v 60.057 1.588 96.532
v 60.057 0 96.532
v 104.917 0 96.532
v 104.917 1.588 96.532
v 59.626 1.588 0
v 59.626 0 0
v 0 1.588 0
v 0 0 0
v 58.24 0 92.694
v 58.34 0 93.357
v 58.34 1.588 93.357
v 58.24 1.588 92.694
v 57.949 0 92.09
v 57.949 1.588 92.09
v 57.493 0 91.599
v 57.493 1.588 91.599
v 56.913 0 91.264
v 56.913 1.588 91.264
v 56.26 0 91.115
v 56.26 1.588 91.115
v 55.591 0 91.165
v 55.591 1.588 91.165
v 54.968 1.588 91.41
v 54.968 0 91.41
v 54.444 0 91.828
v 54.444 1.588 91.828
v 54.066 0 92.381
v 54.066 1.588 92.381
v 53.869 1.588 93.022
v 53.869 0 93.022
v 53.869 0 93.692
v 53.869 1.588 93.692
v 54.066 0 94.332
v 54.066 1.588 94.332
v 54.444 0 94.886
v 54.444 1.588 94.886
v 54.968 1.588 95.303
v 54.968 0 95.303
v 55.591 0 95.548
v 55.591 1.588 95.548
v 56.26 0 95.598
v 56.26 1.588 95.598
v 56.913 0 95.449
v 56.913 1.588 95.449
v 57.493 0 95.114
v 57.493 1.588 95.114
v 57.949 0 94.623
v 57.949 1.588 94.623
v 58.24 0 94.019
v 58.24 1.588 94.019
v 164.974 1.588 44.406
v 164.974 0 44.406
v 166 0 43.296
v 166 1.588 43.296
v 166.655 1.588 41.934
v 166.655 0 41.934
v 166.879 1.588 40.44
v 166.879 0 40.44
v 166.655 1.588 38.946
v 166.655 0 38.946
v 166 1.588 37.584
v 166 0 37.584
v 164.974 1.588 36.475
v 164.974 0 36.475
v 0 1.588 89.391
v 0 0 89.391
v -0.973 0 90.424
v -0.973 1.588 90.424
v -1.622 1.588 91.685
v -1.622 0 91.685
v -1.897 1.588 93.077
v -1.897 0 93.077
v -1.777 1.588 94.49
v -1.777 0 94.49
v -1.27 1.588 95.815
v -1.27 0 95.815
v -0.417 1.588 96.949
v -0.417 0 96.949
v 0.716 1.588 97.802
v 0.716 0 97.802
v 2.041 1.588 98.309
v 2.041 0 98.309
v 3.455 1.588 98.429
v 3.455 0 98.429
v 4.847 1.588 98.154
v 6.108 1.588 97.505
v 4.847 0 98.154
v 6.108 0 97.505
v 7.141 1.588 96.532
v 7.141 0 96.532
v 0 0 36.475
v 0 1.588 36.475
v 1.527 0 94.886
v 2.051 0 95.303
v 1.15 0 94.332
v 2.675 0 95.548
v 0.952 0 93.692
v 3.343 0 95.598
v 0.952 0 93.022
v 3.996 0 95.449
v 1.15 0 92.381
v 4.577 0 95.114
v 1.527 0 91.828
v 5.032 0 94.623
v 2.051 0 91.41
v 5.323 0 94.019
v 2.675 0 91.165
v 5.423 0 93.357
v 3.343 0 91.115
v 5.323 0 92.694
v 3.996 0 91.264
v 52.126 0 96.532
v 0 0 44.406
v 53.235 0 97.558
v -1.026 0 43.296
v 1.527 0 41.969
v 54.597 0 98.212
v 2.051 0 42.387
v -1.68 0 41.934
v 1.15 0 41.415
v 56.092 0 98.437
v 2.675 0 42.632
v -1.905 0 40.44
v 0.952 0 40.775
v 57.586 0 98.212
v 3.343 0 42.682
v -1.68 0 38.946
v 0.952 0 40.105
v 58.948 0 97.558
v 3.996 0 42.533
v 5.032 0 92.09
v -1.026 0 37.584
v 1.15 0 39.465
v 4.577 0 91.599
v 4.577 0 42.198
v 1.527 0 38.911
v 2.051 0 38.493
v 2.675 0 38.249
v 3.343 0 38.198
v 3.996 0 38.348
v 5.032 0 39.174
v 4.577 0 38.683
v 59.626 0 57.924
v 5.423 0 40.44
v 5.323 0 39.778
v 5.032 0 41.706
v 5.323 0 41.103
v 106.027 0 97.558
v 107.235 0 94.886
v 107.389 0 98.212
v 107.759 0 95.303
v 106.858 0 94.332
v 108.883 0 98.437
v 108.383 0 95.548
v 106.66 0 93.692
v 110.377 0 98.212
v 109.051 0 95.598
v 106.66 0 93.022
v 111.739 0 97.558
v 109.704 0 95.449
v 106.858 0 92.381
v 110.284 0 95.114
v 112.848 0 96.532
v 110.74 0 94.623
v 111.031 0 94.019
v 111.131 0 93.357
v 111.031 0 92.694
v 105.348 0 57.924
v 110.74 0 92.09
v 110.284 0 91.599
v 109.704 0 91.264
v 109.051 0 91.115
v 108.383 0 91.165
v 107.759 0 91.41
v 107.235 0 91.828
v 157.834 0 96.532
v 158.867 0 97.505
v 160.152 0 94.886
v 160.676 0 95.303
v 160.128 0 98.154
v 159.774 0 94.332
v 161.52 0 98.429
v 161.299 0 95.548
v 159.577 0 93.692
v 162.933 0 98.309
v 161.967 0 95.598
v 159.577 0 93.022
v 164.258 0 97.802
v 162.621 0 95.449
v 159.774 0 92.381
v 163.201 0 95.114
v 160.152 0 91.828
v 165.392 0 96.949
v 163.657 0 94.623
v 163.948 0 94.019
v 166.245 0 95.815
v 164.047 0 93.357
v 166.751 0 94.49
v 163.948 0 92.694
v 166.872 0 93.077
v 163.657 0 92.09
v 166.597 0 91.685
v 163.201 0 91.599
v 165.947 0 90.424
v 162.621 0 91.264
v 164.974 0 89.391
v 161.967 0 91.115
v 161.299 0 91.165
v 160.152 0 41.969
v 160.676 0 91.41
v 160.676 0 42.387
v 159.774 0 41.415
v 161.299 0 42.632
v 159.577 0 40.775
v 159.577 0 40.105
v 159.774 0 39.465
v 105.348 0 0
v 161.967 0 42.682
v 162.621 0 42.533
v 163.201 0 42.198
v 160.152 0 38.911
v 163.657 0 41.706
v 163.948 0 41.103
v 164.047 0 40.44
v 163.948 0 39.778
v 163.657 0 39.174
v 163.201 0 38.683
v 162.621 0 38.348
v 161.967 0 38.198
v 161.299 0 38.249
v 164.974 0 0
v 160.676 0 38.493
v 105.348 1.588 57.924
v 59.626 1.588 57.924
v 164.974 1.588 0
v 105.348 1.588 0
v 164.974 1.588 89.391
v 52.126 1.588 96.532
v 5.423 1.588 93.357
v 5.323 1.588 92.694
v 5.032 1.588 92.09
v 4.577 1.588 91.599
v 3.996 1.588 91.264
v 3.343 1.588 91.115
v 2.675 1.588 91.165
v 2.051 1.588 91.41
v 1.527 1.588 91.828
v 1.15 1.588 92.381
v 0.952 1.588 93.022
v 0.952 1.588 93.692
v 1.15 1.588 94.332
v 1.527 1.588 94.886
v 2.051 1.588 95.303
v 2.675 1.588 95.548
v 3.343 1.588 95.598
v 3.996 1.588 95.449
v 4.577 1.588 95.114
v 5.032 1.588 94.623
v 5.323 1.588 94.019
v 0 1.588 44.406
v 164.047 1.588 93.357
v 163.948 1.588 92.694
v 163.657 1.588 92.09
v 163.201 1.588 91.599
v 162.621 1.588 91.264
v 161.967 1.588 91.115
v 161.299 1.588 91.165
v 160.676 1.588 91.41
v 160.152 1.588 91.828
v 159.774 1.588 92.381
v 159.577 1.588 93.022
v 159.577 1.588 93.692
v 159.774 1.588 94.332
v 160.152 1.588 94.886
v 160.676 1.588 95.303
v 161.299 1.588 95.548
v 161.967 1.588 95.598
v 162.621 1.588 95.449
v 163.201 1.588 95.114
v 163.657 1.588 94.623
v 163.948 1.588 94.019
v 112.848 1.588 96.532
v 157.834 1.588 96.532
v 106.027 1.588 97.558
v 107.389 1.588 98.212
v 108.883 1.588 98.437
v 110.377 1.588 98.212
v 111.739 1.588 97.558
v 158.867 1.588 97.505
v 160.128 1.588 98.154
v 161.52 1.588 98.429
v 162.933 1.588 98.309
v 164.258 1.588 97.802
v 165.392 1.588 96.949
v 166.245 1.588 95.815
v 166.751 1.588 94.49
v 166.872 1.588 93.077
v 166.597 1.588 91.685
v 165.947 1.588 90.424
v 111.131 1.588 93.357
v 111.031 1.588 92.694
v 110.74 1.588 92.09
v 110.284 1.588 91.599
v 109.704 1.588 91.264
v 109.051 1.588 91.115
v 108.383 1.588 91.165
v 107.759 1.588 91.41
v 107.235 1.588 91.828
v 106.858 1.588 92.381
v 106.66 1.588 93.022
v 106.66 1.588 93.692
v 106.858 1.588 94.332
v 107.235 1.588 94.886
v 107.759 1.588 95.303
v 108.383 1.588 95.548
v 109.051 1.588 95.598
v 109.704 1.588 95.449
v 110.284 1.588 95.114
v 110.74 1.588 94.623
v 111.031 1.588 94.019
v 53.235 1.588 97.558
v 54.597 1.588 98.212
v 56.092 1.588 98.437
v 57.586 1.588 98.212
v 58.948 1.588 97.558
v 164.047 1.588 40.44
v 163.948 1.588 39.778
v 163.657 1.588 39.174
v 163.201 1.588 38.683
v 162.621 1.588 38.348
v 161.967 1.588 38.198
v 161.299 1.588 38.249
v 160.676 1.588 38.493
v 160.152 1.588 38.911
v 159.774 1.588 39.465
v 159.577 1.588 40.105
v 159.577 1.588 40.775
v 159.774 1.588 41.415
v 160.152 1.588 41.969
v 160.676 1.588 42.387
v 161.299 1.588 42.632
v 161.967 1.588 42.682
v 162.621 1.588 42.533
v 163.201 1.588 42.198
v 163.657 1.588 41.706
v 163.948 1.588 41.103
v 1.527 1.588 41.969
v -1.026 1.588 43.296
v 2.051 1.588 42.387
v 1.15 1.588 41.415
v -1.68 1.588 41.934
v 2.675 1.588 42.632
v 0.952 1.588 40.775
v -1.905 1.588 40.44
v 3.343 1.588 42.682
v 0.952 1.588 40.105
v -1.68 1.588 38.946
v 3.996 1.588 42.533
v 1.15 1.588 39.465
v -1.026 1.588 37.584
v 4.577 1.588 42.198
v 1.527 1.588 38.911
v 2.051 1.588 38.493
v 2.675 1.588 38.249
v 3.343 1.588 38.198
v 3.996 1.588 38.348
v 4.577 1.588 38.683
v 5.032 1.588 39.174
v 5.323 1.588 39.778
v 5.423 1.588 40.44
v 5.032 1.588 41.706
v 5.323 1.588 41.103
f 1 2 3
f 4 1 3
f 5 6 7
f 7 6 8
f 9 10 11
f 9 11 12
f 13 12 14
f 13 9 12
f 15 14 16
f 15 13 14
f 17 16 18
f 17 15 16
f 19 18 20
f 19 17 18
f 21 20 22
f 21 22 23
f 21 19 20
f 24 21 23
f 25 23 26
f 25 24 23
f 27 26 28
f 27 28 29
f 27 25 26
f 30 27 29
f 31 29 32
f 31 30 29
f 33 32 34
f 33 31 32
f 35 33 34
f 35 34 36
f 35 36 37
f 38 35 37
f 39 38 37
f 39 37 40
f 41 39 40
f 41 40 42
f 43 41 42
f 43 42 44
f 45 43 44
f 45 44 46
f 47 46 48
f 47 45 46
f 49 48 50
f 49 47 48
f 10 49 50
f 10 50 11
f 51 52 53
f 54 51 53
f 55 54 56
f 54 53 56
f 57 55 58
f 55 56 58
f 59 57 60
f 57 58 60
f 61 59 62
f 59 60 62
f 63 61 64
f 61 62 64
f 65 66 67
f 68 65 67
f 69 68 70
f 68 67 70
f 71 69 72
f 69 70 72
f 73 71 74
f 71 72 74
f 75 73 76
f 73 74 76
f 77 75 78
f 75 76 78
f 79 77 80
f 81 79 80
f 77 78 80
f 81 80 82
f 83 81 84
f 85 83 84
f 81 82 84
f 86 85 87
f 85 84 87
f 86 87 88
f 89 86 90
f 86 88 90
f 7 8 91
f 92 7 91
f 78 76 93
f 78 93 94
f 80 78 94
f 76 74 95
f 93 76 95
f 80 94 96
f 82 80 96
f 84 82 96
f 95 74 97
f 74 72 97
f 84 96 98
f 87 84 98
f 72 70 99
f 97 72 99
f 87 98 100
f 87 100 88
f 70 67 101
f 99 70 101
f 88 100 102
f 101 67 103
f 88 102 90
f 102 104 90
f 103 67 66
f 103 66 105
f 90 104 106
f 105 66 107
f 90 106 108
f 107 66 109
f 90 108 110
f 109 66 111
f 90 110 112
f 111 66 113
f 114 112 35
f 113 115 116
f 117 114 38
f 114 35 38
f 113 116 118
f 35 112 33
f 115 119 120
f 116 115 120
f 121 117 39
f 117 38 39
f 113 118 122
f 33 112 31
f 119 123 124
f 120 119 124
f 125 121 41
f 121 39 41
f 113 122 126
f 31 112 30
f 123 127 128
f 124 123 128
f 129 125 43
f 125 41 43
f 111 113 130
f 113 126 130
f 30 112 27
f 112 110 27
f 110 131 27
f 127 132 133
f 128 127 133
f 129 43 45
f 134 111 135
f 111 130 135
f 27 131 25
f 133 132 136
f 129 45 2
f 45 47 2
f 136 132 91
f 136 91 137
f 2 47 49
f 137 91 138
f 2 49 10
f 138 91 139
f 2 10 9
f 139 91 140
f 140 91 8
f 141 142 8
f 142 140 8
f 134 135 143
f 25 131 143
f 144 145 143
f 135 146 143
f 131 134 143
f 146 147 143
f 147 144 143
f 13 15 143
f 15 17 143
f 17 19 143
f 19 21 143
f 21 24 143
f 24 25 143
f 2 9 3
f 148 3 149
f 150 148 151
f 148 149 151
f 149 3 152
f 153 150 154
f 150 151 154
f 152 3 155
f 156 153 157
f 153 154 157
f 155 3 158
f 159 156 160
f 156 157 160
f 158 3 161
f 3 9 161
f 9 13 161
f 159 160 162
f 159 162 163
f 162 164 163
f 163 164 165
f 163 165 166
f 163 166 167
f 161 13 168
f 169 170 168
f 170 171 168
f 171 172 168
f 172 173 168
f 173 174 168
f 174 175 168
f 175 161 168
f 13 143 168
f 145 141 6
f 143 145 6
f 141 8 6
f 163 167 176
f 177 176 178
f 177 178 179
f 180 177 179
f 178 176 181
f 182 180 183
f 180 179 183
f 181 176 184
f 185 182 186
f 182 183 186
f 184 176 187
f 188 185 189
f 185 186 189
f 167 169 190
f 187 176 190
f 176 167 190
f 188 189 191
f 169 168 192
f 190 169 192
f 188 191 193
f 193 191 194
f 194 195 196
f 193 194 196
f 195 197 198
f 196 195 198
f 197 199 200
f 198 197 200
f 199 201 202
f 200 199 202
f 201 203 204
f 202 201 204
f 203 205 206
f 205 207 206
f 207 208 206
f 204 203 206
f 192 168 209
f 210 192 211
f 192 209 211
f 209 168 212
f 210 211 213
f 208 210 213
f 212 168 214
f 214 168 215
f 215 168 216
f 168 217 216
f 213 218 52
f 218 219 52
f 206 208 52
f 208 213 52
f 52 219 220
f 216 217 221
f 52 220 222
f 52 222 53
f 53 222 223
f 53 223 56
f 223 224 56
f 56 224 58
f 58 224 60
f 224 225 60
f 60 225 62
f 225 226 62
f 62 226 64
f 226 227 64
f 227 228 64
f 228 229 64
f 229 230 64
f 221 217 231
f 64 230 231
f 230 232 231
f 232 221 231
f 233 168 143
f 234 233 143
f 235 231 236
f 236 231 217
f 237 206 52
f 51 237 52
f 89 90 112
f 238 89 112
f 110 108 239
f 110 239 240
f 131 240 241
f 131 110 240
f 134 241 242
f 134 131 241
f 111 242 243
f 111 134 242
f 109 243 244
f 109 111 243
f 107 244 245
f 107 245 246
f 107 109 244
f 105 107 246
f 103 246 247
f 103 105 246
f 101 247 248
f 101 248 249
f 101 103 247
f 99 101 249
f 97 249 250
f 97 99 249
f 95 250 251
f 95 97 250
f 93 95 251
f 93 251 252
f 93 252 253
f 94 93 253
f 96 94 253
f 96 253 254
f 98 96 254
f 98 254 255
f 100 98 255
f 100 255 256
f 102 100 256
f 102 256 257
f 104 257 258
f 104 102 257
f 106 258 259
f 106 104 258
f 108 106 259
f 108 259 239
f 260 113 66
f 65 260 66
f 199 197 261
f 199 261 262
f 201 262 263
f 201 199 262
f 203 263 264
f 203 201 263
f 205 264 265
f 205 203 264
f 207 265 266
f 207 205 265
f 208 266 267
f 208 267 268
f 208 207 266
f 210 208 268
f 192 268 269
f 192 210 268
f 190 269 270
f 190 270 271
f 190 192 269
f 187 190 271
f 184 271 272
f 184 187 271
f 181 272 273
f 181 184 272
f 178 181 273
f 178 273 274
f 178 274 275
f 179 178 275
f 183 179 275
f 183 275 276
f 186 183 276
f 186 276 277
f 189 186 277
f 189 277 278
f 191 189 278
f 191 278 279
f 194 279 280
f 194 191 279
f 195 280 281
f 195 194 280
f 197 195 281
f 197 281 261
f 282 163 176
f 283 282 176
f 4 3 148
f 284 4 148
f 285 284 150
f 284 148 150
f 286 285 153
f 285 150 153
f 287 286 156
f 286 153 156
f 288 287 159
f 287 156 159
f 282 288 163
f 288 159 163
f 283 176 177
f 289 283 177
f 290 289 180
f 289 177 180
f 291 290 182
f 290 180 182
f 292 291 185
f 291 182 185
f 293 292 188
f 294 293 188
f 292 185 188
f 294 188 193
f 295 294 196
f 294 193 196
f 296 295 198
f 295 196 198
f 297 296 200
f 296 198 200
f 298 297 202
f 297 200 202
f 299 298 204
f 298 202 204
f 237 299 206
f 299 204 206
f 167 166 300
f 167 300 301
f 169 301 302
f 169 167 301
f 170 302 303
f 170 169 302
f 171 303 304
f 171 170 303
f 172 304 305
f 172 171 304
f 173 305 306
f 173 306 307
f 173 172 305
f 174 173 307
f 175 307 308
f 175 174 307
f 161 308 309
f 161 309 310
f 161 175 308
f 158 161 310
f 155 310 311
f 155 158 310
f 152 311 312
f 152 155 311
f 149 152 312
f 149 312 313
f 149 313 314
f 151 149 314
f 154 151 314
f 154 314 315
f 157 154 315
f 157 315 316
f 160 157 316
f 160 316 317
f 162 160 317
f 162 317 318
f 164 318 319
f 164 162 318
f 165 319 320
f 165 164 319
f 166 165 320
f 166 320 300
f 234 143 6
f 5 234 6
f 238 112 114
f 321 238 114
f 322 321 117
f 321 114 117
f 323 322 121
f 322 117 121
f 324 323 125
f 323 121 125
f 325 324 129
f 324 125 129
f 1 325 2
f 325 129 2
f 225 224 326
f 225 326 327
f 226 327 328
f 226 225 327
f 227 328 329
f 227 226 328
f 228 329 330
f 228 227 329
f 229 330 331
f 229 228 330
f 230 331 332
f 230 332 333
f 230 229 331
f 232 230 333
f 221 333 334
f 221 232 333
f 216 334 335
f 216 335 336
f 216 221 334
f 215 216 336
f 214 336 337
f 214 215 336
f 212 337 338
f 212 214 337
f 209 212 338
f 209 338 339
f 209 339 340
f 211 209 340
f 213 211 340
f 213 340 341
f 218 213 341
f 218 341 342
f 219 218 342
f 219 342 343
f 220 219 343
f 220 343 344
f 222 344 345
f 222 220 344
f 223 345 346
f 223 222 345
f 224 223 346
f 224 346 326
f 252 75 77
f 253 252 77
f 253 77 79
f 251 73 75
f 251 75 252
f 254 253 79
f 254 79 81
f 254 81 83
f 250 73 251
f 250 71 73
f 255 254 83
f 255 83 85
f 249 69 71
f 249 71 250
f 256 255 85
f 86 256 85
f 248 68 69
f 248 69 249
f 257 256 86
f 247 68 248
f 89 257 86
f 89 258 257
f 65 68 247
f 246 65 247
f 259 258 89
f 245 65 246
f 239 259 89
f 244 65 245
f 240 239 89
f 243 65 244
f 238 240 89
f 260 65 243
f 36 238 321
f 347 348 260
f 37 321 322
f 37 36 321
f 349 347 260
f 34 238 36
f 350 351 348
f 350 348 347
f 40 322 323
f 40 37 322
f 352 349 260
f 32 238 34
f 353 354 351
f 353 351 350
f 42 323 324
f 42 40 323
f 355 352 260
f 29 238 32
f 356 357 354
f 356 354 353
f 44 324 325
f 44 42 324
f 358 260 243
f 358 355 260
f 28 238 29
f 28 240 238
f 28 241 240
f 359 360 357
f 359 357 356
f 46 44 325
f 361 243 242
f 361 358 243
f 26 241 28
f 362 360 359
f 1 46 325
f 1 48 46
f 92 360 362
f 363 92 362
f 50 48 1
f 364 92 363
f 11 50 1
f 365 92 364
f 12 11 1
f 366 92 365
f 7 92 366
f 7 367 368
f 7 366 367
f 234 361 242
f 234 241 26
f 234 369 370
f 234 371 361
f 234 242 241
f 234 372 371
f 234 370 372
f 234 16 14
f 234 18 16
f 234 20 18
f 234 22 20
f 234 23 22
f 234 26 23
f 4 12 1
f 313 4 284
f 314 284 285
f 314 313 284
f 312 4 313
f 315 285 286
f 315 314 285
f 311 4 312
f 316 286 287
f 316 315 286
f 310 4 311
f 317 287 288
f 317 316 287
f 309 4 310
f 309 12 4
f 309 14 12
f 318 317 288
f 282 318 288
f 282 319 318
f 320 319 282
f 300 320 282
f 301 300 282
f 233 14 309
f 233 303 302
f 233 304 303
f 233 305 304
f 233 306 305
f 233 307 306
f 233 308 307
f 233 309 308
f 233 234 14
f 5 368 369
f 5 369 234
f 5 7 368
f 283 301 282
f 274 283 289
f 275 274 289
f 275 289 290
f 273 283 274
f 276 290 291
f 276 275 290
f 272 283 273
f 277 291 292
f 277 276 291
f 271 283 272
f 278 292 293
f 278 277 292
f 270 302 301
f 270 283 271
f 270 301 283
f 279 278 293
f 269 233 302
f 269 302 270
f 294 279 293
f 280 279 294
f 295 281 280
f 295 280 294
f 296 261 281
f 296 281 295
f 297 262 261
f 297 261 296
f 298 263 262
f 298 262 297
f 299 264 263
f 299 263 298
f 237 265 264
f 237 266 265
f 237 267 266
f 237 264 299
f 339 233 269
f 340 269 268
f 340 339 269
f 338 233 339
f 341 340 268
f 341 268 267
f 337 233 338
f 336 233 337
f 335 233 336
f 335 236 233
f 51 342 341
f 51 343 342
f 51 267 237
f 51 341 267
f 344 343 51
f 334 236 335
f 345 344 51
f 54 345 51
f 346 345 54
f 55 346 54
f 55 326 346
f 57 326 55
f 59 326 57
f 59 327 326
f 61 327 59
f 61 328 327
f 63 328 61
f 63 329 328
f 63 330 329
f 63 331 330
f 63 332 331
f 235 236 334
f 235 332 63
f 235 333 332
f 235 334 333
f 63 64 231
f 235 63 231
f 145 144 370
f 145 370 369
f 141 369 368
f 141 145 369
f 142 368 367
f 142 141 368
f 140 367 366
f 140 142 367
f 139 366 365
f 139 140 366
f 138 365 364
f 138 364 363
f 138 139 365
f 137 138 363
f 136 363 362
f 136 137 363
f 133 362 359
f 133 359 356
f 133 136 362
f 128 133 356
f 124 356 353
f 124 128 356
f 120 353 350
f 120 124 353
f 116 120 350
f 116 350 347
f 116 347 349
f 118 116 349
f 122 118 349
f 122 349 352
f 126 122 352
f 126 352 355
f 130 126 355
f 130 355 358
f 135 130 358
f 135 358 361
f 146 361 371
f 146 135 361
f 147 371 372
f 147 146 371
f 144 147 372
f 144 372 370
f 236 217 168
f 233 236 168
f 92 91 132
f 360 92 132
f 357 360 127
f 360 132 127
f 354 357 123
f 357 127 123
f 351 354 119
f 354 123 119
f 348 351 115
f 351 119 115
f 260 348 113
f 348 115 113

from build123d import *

# Parameters (mm, degrees)
SKETCH1_R           = 2.2479
BOSS_EXTRUDE1_DEPTH = 1.5875


with BuildPart() as part:
    # Sketch1 → Boss-Extrude1 (new body)
    with BuildSketch(Plane(origin=(0, 0, 0), x_dir=(1, 0, 0), z_dir=(0, 1, 0))):
        with BuildLine():
            Line((59.6265, 0), (0, 0))
            Line((0, 0), (0, -36.474509804))
            ThreePointArc((0, -36.474509804), (-1.905, -40.440083533), (0, -44.405657262))
            Line((0, -44.405657262), (0, -89.391176471))
            ThreePointArc((0, -89.391176471), (-0.417102448, -96.948852648), (7.140573729, -96.5317502))
            Line((7.140573729, -96.5317502), (52.126092938, -96.5317502))
            ThreePointArc((52.126092938, -96.5317502), (56.091666667, -98.4367502), (60.057240396, -96.5317502))
            Line((60.057240396, -96.5317502), (63.5, -96.5317502))
            Line((63.5, -96.5317502), (69.85, -96.5317502))
            Line((69.85, -96.5317502), (95.25, -96.5317502))
            Line((95.25, -96.5317502), (101.6, -96.5317502))
            Line((101.6, -96.5317502), (104.917251774, -96.5317502))
            ThreePointArc((104.917251774, -96.5317502), (108.882825503, -98.4367502), (112.848399232, -96.5317502))
            Line((112.848399232, -96.5317502), (157.833918441, -96.5317502))
            ThreePointArc((157.833918441, -96.5317502), (165.391594618, -96.948852648), (164.97449217, -89.391176471))
            Line((164.97449217, -89.391176471), (164.97449217, -44.405657262))
            ThreePointArc((164.97449217, -44.405657262), (166.87949217, -40.440083533), (164.97449217, -36.474509804))
            Line((164.97449217, -36.474509804), (164.97449217, 0))
            Line((164.97449217, 0), (105.34799217, 0))
            Line((105.34799217, 0), (105.34799217, -57.9237502))
            Line((105.34799217, -57.9237502), (59.6265, -57.9237502))
            Line((59.6265, -57.9237502), (59.6265, 0))
        make_face()
        with Locations((3.175, -40.440083533)):
            Circle(SKETCH1_R, mode=Mode.SUBTRACT)
        with Locations((3.175, -93.3567502)):
            Circle(SKETCH1_R, mode=Mode.SUBTRACT)
        with Locations((56.091666667, -93.3567502)):
            Circle(SKETCH1_R, mode=Mode.SUBTRACT)
        with Locations((108.882825503, -93.3567502)):
            Circle(SKETCH1_R, mode=Mode.SUBTRACT)
        with Locations((161.79949217, -93.3567502)):
            Circle(SKETCH1_R, mode=Mode.SUBTRACT)
        with Locations((161.79949217, -40.440083533)):
            Circle(SKETCH1_R, mode=Mode.SUBTRACT)
    extrude(amount=BOSS_EXTRUDE1_DEPTH)


solid = part.part
